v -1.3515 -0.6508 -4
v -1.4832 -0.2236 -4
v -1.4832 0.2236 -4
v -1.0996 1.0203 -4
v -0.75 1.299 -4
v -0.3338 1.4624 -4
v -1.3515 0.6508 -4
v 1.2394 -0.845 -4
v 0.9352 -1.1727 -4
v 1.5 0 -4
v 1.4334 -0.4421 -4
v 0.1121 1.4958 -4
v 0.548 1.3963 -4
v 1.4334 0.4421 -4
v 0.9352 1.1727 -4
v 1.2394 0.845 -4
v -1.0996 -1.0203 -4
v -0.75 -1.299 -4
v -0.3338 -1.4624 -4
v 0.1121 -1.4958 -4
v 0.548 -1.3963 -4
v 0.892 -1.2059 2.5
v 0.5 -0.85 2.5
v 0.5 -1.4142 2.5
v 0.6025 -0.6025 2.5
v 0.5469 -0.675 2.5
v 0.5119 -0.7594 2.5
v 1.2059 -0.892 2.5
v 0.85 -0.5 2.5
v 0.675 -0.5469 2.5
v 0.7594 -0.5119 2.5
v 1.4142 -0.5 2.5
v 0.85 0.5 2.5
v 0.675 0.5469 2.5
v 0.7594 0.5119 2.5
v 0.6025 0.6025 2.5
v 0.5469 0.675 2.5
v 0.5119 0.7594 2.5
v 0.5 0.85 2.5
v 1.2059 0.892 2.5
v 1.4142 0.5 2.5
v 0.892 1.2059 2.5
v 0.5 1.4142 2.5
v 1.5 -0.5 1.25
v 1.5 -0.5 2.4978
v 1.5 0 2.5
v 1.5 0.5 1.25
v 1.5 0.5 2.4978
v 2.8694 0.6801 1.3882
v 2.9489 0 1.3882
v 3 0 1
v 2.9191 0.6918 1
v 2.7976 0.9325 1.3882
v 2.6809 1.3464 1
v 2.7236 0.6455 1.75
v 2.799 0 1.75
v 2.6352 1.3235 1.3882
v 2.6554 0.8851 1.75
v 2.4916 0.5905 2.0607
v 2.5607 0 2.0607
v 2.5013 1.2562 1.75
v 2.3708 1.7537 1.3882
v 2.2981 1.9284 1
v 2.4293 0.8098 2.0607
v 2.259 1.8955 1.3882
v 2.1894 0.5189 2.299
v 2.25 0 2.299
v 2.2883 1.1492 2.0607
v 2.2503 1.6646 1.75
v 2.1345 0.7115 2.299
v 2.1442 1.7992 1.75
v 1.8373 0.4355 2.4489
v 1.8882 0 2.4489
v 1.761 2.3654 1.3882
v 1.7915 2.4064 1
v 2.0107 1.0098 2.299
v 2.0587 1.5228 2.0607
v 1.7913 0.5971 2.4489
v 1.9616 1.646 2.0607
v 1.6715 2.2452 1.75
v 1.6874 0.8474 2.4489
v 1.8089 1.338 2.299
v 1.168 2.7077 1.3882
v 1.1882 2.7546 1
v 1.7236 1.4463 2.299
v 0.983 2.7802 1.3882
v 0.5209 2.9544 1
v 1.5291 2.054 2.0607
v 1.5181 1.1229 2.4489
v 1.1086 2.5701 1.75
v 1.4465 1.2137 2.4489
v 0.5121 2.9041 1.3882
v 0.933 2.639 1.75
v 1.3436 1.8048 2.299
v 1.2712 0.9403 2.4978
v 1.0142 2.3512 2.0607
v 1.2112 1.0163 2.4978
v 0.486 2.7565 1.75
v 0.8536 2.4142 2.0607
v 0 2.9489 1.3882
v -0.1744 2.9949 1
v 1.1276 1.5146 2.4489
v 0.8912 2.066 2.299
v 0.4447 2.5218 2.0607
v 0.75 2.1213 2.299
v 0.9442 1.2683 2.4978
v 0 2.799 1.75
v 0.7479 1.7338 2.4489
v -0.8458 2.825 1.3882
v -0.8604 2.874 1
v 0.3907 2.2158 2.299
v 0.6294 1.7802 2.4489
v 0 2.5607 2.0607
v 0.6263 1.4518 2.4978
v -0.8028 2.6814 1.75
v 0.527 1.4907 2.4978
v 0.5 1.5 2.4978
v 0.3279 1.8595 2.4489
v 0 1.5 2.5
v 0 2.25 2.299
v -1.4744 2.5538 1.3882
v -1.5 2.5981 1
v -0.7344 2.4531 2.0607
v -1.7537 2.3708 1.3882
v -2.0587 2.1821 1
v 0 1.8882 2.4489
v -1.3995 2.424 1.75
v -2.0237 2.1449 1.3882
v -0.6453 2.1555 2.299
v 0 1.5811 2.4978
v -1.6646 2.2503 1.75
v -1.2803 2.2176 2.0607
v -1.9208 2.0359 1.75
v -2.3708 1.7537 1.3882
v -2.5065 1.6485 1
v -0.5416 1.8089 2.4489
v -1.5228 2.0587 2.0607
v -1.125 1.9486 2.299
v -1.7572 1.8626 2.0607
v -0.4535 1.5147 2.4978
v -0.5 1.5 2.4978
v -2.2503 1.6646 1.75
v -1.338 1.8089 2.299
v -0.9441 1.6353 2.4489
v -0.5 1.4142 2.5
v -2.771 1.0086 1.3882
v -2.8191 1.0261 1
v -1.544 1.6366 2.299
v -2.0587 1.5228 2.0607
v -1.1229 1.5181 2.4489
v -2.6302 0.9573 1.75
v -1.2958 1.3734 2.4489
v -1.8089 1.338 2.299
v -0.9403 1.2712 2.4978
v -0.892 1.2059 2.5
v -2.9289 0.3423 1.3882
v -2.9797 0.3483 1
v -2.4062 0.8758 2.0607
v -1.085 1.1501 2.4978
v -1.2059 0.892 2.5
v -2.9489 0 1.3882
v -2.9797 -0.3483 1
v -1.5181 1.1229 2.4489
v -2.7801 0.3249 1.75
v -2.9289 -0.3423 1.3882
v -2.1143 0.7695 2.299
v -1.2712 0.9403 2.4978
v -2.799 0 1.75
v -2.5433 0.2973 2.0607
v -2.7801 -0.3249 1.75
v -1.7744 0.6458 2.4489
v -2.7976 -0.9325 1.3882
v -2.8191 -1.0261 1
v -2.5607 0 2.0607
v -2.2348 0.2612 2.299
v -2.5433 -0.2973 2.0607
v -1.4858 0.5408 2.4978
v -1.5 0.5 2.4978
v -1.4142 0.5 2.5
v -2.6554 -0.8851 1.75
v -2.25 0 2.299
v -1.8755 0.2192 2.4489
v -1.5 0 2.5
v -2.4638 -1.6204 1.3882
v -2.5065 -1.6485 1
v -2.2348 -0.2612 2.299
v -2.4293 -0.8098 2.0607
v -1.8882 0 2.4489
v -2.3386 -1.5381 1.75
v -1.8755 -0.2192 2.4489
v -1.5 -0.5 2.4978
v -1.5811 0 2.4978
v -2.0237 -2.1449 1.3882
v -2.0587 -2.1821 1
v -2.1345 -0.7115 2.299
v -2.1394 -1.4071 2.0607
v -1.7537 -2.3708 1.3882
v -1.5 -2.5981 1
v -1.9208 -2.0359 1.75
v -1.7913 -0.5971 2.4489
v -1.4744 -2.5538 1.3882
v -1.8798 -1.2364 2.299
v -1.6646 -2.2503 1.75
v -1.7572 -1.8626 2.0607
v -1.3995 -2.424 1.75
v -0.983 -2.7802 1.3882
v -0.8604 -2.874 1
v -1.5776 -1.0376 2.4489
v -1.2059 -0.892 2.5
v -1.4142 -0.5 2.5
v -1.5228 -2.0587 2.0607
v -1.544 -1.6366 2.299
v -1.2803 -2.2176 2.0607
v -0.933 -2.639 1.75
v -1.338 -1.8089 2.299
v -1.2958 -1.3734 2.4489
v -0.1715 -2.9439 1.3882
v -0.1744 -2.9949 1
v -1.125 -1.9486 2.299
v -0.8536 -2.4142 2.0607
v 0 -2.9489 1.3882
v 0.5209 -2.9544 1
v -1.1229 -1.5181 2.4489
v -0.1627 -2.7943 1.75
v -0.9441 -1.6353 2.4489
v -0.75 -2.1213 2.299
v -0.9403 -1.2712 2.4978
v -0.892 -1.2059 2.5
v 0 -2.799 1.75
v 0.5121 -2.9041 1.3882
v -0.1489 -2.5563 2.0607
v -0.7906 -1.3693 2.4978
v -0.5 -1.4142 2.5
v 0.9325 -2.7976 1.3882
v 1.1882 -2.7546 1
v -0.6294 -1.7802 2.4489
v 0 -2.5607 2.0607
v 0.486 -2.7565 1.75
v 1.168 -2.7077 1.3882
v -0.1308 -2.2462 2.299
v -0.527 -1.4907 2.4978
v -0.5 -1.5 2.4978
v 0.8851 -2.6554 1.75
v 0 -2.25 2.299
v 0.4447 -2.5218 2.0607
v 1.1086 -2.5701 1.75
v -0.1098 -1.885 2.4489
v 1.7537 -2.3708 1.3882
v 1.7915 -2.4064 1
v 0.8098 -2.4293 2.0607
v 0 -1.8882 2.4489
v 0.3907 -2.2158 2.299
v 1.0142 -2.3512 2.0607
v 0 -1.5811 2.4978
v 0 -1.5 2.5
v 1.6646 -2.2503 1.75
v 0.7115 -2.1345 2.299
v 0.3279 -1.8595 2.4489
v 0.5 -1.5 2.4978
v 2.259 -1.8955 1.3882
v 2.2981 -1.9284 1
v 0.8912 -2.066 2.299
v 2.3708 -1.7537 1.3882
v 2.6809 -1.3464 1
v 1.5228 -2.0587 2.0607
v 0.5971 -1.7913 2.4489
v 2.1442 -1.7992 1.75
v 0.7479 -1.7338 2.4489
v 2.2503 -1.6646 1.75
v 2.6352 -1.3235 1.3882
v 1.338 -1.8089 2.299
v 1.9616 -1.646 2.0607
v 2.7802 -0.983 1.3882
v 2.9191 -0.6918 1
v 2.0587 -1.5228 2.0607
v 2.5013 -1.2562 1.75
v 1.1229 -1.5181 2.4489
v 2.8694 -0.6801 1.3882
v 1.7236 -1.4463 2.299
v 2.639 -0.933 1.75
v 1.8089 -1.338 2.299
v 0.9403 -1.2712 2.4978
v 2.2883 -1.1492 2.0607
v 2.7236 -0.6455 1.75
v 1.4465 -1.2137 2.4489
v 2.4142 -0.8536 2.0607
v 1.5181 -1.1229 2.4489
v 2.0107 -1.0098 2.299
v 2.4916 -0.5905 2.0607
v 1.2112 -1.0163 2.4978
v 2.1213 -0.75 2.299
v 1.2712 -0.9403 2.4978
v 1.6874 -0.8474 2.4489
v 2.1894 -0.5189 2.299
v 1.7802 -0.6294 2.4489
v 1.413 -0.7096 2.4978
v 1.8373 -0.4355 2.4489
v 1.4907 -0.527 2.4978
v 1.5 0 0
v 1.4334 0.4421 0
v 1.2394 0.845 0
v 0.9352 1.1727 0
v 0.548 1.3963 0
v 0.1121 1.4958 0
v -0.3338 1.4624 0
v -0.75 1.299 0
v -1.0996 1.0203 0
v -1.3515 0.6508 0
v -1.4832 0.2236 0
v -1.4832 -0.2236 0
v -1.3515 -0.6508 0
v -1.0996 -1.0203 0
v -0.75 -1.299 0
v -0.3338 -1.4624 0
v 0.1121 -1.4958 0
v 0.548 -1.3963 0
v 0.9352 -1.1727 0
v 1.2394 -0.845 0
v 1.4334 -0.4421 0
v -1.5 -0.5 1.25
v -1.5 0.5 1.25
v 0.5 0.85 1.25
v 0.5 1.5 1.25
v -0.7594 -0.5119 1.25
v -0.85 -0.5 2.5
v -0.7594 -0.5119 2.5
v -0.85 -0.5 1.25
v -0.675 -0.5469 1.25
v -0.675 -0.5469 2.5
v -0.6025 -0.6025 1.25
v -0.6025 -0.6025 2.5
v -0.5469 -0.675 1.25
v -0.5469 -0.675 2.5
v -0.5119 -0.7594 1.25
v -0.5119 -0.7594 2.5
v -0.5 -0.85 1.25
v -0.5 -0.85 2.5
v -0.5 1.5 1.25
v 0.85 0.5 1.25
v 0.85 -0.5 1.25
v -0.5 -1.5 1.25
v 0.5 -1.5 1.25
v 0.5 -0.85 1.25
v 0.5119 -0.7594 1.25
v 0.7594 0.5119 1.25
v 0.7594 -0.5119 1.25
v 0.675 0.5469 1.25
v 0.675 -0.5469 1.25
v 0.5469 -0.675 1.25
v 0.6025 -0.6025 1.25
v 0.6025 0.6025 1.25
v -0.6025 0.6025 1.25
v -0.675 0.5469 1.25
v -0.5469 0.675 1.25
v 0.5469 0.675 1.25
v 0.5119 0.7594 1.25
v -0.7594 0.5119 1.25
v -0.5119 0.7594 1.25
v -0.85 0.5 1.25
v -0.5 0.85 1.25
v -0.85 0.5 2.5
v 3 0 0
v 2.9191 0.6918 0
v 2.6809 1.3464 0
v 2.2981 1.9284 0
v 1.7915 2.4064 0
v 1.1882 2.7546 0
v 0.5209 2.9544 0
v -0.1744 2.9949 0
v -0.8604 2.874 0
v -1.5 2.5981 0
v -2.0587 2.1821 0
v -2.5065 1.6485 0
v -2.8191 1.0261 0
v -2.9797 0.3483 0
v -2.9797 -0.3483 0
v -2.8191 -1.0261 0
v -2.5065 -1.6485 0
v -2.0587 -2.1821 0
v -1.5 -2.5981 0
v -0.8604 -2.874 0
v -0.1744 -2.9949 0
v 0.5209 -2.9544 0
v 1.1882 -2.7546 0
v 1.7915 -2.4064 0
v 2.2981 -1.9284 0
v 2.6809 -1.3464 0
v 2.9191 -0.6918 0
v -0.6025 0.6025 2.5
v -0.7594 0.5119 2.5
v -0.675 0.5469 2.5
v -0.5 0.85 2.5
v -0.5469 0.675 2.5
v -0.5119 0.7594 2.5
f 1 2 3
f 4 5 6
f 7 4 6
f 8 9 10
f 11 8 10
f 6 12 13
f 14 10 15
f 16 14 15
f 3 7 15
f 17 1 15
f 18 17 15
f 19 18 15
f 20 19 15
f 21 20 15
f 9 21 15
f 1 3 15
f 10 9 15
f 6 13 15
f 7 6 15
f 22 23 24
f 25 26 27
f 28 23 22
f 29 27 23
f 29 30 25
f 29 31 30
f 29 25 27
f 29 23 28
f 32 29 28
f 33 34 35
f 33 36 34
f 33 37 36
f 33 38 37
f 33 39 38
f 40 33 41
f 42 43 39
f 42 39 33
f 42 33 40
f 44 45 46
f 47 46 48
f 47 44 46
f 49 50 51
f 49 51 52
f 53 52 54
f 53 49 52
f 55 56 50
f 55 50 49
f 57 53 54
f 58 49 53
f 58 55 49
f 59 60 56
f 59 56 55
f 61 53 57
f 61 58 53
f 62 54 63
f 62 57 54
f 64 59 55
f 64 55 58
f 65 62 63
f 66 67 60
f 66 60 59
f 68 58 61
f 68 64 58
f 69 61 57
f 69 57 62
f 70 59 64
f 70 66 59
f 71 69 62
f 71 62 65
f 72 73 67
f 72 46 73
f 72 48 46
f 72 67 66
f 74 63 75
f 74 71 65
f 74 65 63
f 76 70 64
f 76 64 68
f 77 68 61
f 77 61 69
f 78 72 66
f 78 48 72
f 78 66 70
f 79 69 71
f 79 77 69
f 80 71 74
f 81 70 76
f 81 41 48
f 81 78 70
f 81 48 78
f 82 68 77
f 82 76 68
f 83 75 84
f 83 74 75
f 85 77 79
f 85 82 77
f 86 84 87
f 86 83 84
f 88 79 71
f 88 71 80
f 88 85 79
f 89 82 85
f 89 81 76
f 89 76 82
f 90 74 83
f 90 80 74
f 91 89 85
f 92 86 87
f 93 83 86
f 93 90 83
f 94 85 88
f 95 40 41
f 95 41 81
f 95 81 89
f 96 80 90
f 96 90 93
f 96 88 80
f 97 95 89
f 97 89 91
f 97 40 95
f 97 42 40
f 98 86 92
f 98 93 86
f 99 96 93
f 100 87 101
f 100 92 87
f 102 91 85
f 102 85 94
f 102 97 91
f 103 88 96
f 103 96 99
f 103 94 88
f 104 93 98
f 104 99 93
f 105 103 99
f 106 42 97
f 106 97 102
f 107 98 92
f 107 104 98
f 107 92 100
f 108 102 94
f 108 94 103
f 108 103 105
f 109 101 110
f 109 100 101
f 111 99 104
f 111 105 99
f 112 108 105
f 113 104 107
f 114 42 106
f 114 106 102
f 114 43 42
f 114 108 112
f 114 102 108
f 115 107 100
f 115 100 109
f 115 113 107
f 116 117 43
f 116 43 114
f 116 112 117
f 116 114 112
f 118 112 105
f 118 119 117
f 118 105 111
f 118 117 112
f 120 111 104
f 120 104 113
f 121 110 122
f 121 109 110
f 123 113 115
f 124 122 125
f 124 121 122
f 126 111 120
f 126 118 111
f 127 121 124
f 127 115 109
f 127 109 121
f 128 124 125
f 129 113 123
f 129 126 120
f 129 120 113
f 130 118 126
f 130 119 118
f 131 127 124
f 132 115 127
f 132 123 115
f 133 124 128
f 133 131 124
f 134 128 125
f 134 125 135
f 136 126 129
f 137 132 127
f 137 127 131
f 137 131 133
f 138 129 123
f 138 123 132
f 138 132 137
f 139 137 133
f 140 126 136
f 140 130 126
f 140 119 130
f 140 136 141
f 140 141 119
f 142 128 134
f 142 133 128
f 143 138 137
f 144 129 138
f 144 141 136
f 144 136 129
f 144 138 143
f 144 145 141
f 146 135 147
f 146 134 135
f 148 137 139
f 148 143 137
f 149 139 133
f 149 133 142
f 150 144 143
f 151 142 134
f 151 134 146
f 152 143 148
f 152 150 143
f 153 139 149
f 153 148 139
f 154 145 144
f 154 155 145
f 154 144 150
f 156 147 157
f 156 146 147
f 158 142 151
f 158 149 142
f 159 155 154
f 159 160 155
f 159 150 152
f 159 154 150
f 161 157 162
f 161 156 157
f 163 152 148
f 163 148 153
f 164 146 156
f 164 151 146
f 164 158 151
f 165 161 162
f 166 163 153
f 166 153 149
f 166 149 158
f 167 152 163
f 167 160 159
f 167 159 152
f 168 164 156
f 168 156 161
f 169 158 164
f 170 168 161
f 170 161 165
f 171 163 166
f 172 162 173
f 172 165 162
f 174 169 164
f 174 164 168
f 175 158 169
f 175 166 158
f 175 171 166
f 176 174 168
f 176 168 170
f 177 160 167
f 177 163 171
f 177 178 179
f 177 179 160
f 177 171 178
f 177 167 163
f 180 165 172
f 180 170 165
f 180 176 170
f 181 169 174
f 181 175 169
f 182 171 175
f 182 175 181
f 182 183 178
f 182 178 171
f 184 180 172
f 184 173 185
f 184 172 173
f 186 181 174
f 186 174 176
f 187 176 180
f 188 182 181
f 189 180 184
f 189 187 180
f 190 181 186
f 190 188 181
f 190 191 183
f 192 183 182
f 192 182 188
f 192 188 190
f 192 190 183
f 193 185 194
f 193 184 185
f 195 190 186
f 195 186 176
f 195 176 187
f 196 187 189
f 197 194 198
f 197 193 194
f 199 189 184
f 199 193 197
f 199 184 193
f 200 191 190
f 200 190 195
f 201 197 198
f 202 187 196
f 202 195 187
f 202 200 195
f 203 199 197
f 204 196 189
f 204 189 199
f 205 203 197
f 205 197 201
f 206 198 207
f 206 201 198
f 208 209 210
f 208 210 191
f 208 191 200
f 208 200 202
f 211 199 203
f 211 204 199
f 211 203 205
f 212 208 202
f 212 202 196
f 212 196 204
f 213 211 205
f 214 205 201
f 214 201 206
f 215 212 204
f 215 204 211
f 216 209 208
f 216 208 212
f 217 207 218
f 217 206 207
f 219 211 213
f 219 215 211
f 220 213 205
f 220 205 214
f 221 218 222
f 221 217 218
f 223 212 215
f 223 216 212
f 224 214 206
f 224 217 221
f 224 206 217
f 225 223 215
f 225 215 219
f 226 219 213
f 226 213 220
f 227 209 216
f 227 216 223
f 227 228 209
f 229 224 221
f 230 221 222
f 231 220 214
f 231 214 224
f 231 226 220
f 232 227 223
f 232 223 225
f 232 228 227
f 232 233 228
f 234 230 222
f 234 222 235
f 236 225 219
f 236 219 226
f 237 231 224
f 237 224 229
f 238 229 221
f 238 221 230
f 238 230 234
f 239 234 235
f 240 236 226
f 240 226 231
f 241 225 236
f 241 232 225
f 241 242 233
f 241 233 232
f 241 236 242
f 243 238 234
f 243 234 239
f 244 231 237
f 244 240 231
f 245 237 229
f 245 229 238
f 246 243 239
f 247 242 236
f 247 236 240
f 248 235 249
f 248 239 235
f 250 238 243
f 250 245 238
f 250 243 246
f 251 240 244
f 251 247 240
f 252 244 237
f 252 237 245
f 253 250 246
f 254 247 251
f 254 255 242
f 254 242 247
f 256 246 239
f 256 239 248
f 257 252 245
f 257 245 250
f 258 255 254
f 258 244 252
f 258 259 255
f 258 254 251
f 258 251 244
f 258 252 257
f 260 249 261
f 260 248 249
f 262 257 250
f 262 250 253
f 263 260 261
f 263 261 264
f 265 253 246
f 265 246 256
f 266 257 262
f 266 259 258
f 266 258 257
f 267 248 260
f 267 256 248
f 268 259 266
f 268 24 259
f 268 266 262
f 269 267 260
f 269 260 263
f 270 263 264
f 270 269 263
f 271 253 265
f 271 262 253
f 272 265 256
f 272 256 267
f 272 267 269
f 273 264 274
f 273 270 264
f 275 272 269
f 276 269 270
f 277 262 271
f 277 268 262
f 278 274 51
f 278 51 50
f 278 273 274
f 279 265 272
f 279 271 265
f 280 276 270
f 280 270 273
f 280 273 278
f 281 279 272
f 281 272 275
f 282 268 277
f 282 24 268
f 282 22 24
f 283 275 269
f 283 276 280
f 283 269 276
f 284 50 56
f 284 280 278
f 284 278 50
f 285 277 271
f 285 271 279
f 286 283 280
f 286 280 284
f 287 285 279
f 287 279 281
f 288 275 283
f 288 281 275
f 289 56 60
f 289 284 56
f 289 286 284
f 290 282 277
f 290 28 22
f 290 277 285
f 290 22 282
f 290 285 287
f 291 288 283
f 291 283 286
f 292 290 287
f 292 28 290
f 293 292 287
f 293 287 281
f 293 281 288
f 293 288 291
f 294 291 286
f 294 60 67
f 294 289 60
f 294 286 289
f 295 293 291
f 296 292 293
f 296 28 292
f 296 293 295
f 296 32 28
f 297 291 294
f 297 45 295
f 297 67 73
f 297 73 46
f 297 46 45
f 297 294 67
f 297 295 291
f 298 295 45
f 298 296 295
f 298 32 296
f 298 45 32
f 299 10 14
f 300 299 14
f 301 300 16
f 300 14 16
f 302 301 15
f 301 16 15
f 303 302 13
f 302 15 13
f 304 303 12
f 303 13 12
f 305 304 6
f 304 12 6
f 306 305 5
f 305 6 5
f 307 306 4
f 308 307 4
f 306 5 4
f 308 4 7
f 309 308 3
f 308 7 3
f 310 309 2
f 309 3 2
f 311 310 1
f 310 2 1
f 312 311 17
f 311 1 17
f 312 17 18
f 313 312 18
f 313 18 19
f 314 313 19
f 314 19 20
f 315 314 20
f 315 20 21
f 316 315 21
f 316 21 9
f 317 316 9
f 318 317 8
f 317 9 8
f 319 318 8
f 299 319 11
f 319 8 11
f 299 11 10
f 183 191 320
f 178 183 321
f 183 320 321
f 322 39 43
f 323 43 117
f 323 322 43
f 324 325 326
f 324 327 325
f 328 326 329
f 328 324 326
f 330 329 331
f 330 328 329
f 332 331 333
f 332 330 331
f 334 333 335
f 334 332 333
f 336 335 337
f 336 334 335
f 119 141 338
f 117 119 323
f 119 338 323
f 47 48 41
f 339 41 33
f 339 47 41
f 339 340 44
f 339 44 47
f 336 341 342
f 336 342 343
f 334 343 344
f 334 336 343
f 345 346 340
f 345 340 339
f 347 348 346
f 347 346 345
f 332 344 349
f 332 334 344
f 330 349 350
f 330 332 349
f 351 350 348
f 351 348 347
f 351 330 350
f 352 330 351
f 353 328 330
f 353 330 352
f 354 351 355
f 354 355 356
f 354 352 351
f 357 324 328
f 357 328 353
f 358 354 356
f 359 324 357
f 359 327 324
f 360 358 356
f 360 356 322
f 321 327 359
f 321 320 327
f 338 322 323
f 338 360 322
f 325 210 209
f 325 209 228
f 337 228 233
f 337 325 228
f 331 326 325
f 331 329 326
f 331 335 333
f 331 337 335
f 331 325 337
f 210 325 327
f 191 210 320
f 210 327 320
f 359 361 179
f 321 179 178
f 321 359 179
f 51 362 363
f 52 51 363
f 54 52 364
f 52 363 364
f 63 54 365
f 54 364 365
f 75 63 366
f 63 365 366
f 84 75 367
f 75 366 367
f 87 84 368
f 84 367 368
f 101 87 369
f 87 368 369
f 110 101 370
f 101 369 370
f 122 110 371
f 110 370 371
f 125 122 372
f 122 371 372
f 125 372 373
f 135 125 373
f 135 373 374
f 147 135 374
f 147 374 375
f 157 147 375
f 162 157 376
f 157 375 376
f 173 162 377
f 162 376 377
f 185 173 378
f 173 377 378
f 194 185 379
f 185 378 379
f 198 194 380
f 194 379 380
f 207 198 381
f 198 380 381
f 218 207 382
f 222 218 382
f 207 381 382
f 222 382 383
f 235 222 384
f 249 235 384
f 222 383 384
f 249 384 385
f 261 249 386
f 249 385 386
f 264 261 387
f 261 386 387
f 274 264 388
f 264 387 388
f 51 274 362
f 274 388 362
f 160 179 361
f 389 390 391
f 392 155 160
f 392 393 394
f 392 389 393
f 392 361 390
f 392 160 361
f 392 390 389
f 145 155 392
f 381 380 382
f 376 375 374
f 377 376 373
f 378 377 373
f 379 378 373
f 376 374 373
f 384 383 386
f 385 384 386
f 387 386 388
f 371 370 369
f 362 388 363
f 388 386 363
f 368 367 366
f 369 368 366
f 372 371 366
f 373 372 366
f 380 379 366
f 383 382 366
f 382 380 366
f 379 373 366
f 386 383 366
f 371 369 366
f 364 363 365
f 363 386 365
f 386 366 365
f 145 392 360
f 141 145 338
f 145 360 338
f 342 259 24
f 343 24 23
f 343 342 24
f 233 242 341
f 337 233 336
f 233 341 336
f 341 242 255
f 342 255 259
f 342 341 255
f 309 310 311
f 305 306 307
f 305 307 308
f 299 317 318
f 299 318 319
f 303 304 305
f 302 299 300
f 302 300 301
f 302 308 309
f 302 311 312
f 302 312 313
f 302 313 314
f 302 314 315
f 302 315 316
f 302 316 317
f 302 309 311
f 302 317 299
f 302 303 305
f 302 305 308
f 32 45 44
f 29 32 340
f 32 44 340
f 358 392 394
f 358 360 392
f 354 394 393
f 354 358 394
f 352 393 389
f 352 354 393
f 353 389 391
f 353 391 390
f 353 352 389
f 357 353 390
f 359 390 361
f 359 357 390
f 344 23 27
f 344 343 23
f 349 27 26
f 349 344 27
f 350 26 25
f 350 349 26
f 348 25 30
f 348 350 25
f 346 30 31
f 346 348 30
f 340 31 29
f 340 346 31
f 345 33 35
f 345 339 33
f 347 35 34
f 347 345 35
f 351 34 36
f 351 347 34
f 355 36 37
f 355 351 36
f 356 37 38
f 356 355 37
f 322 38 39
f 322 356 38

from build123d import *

# Parameters (mm, degrees)
BOX_W             = 1
BOX_H             = 3
BOX_DEPTH         = 1.5
BOX001_W          = 1
BOX001_H          = 3
BOX001_DEPTH      = 1.5
CYLINDER_R        = 3
CYLINDER_DEPTH    = 2.5
FILLET_R          = 1.5
FILLET001_R       = 0.35
CYLINDER001_R     = 1.5
CYLINDER001_DEPTH = 4


with BuildPart() as cube:
    # Box → Box (new body)
    with BuildSketch(Plane(origin=(-0.5, -1.5, 1.25), x_dir=(1, 0, 0), z_dir=(0, 0, 1))):
        with Locations((0.5, 1.5)):
            Rectangle(BOX_W, BOX_H)
    extrude(amount=BOX_DEPTH)


with BuildPart() as cube001:
    # Box001 → Box001 (new body)
    with BuildSketch(Plane(origin=(1.5, -0.5, 1.25), x_dir=(0, 1, 0), z_dir=(0, 0, 1))):
        with Locations((0.5, 1.5)):
            Rectangle(BOX001_W, BOX001_H)
    extrude(amount=BOX001_DEPTH)


with BuildPart() as fillet001:
    # Cylinder → Cylinder (new body)
    with BuildSketch(Plane.XY):
        Circle(CYLINDER_R)
    extrude(amount=CYLINDER_DEPTH)

    # Fillet
    fillet_edges = [fillet001.edges().sort_by_distance(p)[0] for p in [
        (-3, 0, 2.5),
    ]]
    fillet(fillet_edges, radius=FILLET_R)

    # Cut: cut Cube001
    add(cube001.part, mode=Mode.SUBTRACT)

    # Cut001: cut Cube
    add(cube.part, mode=Mode.SUBTRACT)

    # Fillet001
    fillet001_edges = [fillet001.edges().sort_by_distance(p)[0] for p in [
        (0.5, 0.5, 1.875),
        (-0.5, 0.5, 1.875),
        (-0.5, -0.5, 1.875),
        (0.5, -0.5, 1.875),
    ]]
    fillet(fillet001_edges, radius=FILLET001_R)


with BuildPart() as cylinder001:
    # Cylinder001 → Cylinder001 (new body)
    with BuildSketch(Plane.XY.offset(-4)):
        Circle(CYLINDER001_R)
    extrude(amount=CYLINDER001_DEPTH)


solid = Compound([fillet001.part, cylinder001.part])
